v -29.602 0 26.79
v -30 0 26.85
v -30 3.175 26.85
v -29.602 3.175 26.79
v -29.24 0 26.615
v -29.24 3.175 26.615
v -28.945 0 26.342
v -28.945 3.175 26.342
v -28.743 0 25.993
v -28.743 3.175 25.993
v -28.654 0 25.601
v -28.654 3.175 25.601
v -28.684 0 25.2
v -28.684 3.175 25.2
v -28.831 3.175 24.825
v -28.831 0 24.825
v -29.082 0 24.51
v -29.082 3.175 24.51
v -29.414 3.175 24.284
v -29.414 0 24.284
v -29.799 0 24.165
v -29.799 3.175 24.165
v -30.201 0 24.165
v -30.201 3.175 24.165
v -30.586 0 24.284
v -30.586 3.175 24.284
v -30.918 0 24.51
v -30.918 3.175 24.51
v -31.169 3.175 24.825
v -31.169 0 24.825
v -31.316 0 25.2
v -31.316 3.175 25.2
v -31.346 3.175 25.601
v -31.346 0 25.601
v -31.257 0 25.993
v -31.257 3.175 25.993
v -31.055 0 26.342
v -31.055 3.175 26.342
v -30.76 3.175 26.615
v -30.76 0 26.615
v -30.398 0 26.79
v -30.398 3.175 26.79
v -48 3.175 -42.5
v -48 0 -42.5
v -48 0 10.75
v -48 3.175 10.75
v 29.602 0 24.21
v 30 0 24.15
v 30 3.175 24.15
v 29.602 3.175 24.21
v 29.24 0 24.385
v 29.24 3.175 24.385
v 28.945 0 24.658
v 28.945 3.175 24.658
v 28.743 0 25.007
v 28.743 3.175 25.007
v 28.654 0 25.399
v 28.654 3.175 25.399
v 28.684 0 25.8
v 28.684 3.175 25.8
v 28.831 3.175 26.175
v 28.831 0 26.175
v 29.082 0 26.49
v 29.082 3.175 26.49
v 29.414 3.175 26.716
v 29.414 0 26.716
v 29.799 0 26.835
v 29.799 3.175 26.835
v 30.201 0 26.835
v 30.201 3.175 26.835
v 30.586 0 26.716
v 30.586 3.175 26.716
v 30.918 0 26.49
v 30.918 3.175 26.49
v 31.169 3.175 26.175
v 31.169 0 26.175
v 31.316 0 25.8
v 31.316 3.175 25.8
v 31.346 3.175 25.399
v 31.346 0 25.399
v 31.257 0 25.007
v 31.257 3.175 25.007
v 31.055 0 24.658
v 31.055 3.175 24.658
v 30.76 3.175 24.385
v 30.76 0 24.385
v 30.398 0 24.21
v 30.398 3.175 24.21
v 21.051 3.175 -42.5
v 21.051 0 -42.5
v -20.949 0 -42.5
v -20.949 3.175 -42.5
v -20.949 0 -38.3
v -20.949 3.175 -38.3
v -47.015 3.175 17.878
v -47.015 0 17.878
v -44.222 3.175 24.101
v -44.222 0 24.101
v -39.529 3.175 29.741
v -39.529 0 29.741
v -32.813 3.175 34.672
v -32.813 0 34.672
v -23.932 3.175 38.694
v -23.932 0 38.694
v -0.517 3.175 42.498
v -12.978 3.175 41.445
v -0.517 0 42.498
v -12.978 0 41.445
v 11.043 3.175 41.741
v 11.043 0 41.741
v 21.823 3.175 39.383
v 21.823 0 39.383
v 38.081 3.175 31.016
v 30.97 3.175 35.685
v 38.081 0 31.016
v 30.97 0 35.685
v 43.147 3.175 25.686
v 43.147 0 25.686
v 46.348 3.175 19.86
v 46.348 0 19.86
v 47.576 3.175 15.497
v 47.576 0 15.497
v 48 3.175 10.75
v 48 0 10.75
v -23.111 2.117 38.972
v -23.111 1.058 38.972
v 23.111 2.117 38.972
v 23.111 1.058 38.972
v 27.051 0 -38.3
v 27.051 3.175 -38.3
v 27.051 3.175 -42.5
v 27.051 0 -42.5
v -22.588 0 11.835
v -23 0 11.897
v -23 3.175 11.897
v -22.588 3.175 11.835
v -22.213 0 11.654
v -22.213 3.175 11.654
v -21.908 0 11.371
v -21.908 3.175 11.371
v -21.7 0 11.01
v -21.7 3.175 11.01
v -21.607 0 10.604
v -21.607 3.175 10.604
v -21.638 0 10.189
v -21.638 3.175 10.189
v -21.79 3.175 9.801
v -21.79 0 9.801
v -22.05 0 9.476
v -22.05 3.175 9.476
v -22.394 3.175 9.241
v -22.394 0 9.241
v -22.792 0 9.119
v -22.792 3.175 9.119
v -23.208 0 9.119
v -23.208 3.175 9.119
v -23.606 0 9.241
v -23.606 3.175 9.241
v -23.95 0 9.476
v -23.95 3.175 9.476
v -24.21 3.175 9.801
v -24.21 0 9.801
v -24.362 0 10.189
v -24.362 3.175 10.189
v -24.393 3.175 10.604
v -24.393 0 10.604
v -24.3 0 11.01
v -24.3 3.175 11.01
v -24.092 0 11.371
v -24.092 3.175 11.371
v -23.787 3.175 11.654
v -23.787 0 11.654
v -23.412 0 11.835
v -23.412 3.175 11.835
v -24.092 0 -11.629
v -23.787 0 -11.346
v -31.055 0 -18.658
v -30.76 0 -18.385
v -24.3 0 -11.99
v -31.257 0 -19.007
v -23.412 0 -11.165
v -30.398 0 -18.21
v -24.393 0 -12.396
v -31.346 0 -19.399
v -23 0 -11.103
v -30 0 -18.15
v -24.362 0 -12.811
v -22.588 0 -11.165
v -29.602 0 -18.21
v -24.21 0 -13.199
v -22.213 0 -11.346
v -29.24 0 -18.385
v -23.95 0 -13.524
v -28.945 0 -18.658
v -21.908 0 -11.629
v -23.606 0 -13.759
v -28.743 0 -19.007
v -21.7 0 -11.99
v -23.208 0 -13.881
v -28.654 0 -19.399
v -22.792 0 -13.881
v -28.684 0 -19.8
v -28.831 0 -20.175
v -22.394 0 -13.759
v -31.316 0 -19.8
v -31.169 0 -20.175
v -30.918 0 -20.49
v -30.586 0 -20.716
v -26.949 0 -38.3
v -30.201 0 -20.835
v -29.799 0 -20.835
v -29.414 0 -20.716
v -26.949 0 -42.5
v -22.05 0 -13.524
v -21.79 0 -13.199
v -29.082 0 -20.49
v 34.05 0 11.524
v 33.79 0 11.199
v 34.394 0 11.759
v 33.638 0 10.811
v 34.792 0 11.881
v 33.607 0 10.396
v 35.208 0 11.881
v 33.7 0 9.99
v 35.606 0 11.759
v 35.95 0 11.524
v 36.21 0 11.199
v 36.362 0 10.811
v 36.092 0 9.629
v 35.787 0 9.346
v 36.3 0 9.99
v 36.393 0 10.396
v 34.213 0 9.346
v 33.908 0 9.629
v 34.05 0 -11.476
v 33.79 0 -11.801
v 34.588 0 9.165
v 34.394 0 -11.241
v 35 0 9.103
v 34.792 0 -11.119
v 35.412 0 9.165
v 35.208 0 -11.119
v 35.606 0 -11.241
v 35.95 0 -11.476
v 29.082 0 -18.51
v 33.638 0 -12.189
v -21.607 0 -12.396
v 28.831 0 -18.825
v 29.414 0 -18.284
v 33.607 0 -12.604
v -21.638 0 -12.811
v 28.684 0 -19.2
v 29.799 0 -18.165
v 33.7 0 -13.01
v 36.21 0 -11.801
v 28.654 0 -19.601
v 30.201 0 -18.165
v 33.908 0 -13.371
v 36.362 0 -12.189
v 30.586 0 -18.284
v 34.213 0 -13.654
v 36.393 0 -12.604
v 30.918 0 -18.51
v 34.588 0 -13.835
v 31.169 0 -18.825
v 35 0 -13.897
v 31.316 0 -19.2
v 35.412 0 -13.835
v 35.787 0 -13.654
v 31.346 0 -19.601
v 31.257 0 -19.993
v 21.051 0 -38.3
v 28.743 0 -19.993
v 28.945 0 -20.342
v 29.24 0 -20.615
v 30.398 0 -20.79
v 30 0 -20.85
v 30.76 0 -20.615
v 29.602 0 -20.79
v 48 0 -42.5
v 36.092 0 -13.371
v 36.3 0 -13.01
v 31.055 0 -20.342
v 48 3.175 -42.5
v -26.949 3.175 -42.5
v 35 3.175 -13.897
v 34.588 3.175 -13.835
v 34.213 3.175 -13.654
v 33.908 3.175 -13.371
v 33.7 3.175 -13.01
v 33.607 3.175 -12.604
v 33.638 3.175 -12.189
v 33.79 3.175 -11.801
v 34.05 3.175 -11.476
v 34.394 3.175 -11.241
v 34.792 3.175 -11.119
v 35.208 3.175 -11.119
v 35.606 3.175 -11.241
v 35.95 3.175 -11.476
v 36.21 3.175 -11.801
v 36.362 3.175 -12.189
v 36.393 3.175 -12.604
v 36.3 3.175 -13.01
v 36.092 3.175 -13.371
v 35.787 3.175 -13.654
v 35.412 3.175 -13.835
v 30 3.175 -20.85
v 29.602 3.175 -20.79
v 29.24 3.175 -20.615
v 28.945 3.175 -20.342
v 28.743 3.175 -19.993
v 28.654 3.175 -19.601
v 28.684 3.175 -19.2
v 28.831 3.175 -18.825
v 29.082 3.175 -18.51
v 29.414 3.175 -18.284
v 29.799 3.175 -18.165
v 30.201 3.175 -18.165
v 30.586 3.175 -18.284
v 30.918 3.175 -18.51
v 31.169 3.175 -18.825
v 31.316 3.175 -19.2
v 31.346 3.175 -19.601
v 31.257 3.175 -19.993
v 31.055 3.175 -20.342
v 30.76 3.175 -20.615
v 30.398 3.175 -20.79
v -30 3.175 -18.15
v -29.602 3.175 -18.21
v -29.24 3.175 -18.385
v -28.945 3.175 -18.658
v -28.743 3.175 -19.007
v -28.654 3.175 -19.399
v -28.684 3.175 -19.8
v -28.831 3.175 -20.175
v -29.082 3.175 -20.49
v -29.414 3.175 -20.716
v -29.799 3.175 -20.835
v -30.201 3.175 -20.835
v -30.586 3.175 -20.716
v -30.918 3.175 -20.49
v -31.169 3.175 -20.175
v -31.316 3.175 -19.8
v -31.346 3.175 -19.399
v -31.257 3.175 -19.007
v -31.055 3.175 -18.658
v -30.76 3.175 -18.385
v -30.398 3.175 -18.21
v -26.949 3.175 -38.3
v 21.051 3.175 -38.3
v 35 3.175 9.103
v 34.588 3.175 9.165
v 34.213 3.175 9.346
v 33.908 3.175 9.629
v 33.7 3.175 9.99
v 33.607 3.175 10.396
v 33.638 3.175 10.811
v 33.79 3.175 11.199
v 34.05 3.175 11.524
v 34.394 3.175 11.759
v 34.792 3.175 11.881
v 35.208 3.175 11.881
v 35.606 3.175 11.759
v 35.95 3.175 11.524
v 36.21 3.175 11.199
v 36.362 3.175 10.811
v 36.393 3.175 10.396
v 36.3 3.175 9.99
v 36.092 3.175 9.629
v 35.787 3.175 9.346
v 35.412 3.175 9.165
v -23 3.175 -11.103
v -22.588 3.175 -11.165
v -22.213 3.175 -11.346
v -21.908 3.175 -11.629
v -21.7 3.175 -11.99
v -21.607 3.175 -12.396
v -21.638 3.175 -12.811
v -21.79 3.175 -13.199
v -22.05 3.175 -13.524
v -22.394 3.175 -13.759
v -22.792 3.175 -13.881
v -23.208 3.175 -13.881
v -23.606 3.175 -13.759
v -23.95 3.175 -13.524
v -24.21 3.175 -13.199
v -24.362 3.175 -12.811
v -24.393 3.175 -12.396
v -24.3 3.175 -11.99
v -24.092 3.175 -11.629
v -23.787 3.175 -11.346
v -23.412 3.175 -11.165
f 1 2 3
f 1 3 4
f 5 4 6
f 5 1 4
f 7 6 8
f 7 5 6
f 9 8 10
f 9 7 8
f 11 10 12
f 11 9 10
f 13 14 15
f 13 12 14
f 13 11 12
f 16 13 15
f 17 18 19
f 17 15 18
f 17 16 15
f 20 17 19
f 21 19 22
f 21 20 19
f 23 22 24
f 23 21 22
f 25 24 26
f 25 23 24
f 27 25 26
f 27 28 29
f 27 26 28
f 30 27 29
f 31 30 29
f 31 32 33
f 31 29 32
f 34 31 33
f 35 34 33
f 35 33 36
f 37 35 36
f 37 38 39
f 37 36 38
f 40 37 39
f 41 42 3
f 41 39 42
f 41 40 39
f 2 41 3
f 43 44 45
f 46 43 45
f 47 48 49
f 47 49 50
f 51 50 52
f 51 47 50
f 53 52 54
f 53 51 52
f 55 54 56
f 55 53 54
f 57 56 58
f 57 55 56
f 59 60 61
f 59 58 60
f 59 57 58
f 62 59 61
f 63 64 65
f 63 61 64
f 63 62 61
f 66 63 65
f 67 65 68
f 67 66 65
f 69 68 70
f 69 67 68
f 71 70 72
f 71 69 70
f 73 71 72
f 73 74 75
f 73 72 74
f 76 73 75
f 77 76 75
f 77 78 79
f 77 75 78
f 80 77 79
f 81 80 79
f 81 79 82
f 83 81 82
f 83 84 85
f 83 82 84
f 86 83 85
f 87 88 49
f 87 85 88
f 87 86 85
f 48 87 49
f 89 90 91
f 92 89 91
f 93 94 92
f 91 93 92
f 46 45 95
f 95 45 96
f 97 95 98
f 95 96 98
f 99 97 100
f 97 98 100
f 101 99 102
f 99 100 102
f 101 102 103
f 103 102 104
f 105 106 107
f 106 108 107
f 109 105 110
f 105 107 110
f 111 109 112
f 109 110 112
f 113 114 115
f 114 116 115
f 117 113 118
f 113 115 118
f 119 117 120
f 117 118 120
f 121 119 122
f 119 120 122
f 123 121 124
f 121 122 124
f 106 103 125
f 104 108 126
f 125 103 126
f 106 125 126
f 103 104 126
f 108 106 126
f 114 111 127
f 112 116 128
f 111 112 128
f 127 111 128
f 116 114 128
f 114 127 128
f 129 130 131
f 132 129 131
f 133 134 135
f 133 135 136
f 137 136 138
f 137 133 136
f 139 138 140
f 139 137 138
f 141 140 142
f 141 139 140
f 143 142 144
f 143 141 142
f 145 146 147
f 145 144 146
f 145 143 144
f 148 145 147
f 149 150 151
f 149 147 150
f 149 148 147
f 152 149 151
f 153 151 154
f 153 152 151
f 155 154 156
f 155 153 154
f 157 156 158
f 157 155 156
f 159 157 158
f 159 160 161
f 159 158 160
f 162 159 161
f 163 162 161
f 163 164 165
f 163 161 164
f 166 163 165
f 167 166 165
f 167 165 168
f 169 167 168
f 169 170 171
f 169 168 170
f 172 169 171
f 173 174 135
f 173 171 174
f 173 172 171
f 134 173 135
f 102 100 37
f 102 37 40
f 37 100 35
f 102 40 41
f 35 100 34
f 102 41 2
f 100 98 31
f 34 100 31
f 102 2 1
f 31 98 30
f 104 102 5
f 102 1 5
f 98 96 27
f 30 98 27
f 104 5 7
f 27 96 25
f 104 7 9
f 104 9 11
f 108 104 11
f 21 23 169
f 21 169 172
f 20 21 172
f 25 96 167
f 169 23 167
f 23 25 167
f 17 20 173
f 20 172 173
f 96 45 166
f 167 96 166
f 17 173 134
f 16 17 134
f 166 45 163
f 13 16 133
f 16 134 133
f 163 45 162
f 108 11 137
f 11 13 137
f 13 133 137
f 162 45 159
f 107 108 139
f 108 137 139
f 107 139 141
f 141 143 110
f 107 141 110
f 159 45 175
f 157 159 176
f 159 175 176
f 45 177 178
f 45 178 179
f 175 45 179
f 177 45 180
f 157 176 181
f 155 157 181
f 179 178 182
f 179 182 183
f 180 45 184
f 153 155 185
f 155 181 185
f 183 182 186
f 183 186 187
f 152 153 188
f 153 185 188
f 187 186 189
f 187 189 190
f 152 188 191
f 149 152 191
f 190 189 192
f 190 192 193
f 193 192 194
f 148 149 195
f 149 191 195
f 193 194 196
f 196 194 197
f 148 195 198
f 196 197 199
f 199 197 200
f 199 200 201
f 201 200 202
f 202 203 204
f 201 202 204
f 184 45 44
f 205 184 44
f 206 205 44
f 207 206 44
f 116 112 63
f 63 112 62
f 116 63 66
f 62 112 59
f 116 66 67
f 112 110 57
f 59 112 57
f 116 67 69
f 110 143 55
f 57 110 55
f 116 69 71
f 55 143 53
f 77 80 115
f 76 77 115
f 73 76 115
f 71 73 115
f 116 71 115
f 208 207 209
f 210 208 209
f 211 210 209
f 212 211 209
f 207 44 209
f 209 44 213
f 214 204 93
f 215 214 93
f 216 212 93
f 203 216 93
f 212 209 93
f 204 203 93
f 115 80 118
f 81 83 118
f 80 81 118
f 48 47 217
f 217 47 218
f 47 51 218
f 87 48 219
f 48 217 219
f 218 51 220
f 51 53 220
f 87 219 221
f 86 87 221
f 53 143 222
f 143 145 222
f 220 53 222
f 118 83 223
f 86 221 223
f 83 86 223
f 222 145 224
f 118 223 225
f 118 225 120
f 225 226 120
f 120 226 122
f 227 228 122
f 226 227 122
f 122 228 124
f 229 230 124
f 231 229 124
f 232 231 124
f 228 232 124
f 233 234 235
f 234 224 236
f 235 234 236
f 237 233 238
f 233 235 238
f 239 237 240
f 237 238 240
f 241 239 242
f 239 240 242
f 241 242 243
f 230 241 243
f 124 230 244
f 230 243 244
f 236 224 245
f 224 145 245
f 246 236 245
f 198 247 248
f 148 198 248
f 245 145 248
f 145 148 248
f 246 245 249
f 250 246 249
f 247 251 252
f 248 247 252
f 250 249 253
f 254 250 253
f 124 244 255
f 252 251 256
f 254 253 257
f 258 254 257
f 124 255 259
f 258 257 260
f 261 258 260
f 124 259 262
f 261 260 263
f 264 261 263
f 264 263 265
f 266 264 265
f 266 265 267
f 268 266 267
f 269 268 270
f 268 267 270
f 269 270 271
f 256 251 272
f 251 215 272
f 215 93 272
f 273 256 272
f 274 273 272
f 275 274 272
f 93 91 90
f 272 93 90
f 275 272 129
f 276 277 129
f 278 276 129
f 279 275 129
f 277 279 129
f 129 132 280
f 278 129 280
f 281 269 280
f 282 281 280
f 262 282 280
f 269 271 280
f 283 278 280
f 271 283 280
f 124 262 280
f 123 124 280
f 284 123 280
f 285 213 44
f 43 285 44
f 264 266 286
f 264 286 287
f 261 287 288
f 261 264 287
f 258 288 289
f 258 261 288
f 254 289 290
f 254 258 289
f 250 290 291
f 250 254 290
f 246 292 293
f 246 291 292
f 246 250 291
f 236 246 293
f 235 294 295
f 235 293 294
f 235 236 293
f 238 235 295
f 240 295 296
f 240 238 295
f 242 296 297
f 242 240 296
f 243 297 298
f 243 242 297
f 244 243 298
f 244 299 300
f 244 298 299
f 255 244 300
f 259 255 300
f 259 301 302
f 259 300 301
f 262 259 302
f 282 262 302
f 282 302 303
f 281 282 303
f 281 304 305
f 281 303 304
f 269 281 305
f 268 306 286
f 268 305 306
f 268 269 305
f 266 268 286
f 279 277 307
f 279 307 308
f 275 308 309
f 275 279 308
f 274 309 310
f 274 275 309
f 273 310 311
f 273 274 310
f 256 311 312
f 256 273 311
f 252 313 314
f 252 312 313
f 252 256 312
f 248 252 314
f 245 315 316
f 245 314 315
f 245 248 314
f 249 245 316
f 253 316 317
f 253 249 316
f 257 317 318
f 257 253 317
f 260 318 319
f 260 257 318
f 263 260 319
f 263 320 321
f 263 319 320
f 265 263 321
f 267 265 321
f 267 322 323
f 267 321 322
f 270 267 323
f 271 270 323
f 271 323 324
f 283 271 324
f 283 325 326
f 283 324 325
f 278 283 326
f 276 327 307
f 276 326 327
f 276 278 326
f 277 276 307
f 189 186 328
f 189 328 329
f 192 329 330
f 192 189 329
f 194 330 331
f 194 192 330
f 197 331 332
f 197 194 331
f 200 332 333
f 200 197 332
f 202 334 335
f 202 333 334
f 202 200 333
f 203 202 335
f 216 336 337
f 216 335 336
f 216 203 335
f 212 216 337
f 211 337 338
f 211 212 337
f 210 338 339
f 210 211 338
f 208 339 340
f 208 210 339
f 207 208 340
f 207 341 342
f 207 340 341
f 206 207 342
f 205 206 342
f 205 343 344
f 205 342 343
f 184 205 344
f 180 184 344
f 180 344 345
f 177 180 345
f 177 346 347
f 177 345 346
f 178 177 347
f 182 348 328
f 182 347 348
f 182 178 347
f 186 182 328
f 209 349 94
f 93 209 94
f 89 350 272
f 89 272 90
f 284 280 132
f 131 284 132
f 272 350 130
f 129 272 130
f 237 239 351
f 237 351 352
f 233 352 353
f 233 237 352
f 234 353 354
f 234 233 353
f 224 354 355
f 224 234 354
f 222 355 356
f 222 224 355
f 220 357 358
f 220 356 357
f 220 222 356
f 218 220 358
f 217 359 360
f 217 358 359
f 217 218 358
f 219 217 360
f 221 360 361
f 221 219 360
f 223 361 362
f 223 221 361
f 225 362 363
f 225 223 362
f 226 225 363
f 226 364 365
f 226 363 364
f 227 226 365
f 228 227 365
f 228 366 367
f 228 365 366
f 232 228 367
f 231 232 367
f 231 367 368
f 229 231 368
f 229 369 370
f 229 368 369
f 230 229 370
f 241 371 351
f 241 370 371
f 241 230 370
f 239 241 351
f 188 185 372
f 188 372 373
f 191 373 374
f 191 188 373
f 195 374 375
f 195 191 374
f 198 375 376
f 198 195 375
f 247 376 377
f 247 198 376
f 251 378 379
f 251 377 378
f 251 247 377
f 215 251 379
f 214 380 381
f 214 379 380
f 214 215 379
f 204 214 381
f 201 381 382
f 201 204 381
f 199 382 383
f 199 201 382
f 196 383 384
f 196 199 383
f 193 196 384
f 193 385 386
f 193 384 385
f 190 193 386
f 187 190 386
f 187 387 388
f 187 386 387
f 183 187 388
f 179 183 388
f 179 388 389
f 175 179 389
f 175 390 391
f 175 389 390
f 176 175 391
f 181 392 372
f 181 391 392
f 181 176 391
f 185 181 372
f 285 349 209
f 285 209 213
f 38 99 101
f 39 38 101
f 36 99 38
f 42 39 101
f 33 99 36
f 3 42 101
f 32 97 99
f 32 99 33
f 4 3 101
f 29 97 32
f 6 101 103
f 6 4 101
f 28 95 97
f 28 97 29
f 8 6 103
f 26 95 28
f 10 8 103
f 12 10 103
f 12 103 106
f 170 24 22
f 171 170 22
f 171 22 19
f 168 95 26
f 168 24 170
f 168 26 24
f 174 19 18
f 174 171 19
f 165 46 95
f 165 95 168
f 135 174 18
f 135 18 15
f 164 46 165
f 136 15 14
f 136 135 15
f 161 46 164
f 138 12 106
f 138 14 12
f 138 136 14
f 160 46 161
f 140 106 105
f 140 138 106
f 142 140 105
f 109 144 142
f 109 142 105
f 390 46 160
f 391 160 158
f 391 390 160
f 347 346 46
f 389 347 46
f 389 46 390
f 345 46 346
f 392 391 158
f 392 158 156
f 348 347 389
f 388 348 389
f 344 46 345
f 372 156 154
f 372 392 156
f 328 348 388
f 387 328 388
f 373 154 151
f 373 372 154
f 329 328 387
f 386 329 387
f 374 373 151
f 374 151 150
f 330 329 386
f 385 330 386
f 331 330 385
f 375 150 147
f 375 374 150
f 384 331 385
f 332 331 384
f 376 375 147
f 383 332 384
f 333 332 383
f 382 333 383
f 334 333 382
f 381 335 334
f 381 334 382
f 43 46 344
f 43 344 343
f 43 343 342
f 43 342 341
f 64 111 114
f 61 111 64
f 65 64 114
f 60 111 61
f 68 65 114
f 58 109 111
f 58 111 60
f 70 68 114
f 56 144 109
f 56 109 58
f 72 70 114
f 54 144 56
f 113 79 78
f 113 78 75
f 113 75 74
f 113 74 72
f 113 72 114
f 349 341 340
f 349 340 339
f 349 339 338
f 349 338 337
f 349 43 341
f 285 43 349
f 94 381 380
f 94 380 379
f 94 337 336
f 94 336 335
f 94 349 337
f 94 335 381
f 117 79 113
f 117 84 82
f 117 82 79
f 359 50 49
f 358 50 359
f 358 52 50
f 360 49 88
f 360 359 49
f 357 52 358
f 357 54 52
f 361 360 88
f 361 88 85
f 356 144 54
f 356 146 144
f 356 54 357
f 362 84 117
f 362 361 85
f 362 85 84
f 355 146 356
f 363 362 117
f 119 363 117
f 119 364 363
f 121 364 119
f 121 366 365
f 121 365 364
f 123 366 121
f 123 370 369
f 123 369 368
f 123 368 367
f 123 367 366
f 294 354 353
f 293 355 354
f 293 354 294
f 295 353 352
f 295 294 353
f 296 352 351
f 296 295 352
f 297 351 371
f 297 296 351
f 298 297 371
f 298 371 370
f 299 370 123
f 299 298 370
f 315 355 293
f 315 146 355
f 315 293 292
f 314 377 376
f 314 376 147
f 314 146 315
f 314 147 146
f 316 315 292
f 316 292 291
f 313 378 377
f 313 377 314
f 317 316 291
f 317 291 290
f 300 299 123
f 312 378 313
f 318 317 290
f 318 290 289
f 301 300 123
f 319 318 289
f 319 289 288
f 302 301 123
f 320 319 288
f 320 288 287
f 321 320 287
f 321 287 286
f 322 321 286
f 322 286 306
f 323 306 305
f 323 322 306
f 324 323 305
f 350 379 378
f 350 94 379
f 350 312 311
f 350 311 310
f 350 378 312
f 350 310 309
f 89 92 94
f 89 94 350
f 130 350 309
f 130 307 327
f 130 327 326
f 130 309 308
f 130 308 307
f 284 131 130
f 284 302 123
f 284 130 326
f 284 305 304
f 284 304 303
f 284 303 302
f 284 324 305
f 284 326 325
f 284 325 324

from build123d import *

# Parameters (mm, degrees)
BOSS_EXTRUDE1_DEPTH     = 3.175
CUT_EXTRUDE1_DEPTH      = 65.189801711
CUT_EXTRUDE1_DEPTH_BACK = 65.189801711
SKETCH3_R               = 1.35
SKETCH3_R_2             = 1.397
SKETCH5_W               = 6
SKETCH5_H               = 4.2
CUT_EXTRUDE2_DEPTH      = 65.189801711


with BuildPart() as part:
    # Sketch2 → Boss-Extrude1 (new body)
    with BuildSketch(Plane(origin=(0, 0, 0), x_dir=(1, 0, 0), z_dir=(0, 1, 0))):
        with BuildLine():
            Line((48, 42.5), (-48, 42.5))
            Line((-48, 42.5), (-48, -10.75))
            add(Edge.make_bspline(
                [(-48, -10.75), (-48, -53.083333333), (48, -53.083333333), (48, -10.75)],
                knots=[0, 0, 0, 0, 1, 1, 1, 1], degree=3))
            Line((48, -10.75), (48, 42.5))
        make_face()
    extrude(amount=BOSS_EXTRUDE1_DEPTH)

    # Sketch3 → Cut-Extrude1 (cut, two sides: drawn at the far end of the back side and taken through both)
    with BuildSketch(Plane(origin=(0, 3.175, 0), x_dir=(1, 0, 0), z_dir=(0, 1, 0)).offset(-CUT_EXTRUDE1_DEPTH_BACK)):
        with Locations(Location((-30, 19.5, 0), (0, 0, 270))):
            Circle(SKETCH3_R)
        with Locations(Location((-30, -25.5, 0), (0, 0, 270))):
            Circle(SKETCH3_R)
        with Locations(Location((30, -25.5, 0), (0, 0, 90))):
            Circle(SKETCH3_R)
        with Locations(Location((30, 19.5, 0), (0, 0, 90))):
            Circle(SKETCH3_R)
        with Locations(Location((-23, 12.5, 0), (0, 0, 270))):
            Circle(SKETCH3_R_2)
        with Locations(Location((-23, -10.5, 0), (0, 0, 270))):
            Circle(SKETCH3_R_2)
        with Locations(Location((35, -10.5, 0), (0, 0, 90))):
            Circle(SKETCH3_R_2)
        with Locations(Location((35, 12.5, 0), (0, 0, 90))):
            Circle(SKETCH3_R_2)
    extrude(amount=CUT_EXTRUDE1_DEPTH + CUT_EXTRUDE1_DEPTH_BACK, mode=Mode.SUBTRACT)

    # Sketch5 → Cut-Extrude2 (cut, through all)
    with BuildSketch(Plane(origin=(0, 3.175, 0), x_dir=(1, 0, 0), z_dir=(0, 1, 0))):
        with Locations((24.051144599, 40.4)):
            Rectangle(SKETCH5_W, SKETCH5_H)
        with Locations((-23.948855401, 40.4)):
            Rectangle(SKETCH5_W, SKETCH5_H)
    extrude(amount=-CUT_EXTRUDE2_DEPTH, mode=Mode.SUBTRACT)


solid = part.part
